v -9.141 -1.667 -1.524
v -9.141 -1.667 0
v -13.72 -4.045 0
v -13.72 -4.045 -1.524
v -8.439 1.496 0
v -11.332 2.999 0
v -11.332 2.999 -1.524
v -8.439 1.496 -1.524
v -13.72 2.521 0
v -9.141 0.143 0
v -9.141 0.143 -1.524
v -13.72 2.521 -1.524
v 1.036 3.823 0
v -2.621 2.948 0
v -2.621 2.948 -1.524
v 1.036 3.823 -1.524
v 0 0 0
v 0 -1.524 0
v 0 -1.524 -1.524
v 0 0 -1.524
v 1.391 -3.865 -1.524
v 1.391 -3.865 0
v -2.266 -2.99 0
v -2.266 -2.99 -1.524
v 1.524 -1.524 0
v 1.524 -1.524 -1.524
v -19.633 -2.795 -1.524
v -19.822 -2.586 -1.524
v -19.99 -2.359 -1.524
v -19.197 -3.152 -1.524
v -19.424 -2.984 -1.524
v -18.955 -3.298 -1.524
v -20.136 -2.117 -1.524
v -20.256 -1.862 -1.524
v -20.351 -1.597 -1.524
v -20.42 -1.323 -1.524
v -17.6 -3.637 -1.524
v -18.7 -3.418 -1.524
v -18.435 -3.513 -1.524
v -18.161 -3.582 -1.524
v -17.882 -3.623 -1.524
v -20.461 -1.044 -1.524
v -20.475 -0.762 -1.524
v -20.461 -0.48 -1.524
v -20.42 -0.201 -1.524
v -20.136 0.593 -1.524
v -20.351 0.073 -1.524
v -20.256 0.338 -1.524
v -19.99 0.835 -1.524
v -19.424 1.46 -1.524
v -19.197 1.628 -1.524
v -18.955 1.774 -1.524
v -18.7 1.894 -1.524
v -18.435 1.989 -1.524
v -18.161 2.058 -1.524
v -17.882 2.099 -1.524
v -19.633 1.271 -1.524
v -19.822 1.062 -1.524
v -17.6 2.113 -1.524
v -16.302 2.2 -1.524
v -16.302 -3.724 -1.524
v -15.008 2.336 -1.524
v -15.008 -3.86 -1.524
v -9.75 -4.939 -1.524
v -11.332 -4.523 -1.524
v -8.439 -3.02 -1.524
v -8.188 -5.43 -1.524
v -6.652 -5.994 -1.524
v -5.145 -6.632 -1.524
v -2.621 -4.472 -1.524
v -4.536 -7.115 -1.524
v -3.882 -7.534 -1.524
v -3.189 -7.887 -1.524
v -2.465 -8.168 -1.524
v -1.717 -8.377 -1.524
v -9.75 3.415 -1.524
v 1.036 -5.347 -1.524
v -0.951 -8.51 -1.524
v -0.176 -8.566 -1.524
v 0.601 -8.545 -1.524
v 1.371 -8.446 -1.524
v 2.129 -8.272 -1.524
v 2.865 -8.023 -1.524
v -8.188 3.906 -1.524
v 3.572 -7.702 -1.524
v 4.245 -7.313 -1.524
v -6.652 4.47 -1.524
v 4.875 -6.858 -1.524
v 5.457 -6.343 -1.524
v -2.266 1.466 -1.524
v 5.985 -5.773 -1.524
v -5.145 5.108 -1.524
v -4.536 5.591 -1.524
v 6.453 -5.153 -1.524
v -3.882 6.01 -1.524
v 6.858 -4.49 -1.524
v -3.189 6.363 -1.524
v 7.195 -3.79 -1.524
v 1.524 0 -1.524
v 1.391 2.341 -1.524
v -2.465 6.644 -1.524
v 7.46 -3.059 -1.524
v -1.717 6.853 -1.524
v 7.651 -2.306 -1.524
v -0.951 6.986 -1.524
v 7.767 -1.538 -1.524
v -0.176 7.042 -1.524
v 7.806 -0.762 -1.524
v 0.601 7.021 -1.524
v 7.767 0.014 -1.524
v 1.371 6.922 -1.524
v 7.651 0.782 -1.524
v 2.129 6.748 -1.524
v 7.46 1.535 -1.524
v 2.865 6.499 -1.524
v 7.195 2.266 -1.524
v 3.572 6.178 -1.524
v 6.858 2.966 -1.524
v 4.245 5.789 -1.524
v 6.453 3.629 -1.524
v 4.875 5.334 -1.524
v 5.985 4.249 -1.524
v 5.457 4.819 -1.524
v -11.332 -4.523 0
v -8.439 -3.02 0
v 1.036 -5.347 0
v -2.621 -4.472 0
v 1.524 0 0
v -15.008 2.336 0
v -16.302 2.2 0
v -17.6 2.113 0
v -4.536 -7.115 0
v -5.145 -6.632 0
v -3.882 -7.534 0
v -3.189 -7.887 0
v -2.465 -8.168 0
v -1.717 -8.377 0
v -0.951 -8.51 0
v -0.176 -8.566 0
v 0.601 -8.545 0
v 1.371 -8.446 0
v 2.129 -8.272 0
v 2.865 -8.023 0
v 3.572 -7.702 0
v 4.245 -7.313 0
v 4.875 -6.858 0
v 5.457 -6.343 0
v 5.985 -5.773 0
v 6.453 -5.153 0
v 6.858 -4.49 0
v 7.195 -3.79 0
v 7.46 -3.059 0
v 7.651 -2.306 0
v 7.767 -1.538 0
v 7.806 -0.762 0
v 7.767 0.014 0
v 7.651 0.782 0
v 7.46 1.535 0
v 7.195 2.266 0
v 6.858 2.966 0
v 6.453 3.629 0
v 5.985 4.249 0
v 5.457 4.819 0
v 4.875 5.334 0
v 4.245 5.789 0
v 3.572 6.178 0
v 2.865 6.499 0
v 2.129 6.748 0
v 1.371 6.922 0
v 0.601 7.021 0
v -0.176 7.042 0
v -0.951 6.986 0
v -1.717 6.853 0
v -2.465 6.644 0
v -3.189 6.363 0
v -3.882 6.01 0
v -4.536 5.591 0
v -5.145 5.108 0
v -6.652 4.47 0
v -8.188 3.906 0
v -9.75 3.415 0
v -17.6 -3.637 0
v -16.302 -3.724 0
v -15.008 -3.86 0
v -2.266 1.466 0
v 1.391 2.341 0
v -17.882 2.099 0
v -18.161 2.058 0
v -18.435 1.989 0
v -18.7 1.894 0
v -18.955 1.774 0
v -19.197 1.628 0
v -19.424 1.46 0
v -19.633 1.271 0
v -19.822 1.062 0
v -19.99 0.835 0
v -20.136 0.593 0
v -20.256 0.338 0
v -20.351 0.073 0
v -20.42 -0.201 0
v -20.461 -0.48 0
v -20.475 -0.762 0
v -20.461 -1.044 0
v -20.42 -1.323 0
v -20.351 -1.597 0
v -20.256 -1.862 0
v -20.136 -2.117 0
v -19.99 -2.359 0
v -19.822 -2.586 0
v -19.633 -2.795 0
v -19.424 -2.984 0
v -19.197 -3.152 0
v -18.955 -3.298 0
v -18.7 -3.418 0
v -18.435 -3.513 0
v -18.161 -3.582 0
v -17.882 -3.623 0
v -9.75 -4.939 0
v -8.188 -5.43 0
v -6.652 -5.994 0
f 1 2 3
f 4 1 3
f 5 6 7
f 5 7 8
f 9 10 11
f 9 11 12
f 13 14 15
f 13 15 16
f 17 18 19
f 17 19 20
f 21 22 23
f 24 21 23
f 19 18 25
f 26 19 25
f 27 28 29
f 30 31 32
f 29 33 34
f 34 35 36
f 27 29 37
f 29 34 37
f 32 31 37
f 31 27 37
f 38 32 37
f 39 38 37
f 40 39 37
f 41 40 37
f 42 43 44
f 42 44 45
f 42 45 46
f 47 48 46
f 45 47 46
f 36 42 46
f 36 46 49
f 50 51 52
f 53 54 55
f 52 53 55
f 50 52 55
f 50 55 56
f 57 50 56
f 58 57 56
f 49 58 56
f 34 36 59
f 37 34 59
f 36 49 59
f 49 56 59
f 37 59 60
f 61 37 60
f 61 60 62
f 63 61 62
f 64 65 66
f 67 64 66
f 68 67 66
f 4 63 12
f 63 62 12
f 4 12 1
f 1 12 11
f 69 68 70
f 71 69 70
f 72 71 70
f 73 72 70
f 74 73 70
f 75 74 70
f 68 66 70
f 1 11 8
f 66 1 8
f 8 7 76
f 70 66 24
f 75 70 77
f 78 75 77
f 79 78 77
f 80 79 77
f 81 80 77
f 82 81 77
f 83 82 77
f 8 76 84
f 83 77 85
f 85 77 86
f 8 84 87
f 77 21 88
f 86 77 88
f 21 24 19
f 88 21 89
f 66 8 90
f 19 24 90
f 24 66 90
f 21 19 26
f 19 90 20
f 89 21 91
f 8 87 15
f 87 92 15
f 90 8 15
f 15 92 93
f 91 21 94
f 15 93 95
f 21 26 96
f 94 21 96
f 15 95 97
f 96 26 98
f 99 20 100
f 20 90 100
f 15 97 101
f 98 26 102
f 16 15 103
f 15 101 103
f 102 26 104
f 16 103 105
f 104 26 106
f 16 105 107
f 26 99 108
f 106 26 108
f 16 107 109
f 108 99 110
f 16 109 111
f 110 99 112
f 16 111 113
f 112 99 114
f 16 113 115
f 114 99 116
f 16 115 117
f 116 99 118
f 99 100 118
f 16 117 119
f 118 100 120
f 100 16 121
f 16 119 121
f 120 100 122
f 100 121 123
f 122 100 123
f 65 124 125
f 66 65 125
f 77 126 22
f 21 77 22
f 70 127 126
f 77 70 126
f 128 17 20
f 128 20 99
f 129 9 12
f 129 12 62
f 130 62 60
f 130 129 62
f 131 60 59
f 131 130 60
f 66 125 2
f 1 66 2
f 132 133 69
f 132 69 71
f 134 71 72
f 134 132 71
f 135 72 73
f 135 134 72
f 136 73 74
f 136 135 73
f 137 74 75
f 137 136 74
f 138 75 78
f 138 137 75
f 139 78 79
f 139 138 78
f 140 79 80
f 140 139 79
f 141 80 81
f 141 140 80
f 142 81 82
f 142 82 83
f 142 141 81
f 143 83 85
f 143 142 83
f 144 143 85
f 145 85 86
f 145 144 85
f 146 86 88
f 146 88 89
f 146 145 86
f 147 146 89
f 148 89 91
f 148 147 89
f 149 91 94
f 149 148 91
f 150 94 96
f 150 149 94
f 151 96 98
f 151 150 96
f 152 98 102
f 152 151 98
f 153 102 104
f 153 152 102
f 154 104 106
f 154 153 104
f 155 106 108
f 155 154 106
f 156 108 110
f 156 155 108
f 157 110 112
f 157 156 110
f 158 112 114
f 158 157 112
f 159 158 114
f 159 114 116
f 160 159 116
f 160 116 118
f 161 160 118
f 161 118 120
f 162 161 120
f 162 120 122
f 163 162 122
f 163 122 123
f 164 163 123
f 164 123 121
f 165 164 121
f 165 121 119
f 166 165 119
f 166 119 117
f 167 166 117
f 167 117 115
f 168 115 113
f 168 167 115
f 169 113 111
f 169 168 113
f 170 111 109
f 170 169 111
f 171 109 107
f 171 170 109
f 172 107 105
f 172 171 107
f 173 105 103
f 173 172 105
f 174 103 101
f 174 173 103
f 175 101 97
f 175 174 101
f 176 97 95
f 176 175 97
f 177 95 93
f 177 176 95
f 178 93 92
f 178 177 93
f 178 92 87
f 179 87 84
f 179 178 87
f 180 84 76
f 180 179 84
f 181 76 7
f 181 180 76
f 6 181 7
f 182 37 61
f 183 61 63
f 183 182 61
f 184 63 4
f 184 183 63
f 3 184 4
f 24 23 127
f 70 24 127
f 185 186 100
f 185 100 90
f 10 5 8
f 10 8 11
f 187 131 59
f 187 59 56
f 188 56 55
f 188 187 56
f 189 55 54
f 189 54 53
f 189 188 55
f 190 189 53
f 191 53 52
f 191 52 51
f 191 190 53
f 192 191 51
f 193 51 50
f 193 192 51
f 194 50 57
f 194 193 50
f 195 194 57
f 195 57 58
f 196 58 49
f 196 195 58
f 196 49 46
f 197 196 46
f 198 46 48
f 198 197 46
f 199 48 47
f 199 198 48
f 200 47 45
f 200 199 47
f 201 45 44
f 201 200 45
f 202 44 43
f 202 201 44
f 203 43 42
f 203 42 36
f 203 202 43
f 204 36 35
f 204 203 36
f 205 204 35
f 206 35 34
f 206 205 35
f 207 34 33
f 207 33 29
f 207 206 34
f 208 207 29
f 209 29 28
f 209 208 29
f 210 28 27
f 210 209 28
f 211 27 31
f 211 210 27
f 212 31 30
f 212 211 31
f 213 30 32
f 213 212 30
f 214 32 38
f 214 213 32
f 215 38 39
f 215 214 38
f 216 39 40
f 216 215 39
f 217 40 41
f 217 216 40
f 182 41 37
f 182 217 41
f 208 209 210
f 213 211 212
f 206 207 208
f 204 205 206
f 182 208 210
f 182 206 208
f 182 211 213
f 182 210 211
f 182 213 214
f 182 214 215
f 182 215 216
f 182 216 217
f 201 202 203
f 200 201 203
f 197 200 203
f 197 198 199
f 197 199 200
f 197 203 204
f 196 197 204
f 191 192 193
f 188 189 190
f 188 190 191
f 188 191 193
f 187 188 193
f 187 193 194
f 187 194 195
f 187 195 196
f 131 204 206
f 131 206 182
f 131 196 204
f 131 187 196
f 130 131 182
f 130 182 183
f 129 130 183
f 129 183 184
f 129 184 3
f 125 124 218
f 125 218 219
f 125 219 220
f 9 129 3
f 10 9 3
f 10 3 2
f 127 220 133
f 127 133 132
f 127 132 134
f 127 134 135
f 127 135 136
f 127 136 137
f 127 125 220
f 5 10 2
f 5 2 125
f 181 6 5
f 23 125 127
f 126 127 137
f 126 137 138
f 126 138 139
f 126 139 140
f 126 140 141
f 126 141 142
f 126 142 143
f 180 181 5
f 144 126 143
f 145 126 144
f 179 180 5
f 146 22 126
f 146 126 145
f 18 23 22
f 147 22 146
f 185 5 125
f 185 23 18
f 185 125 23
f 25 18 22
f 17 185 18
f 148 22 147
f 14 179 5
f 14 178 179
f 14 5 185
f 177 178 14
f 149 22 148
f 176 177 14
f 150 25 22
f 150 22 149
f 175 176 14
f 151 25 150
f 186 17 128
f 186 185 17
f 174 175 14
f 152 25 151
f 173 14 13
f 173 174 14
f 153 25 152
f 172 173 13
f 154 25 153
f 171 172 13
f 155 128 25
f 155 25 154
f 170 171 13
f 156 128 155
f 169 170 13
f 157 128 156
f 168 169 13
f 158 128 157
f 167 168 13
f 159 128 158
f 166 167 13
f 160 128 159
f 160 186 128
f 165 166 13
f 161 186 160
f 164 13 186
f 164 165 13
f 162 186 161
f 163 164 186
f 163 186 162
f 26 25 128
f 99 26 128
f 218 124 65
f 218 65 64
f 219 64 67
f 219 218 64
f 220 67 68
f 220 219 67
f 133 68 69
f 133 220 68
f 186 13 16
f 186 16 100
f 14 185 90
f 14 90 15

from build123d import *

# Parameters (mm, degrees)
SKETCH1_W           = 1.524
SKETCH1_H           = 1.524
BOSS_EXTRUDE1_DEPTH = 1.524
CUT_EXTRUDE1_DEPTH  = 2.54
CUT_EXTRUDE2_DEPTH  = 2.54


with BuildPart() as part:
    # Sketch1 → Boss-Extrude1 (new body)
    with BuildSketch(Plane.XY):
        with BuildLine():
            ThreePointArc((-5.144991791, -6.632201856), (7.805780573, -0.762), (-5.144991791, 5.108201856))
            ThreePointArc((-5.144991791, 5.108201856), (-11.231180242, 3.023042691), (-17.599967494, 2.113027551))
            ThreePointArc((-17.599967494, 2.113027551), (-20.474995045, -0.762), (-17.599967494, -3.637027551))
            ThreePointArc((-17.599967494, -3.637027551), (-11.231180242, -4.547042691), (-5.144991791, -6.632201856))
        make_face()
        with Locations((0.762, -0.762)):
            Rectangle(SKETCH1_W, SKETCH1_H, mode=Mode.SUBTRACT)
    extrude(amount=-BOSS_EXTRUDE1_DEPTH)

    # Sketch2 → Cut-Extrude1 (cut)
    with BuildSketch(Plane.XY):
        Polygon((-9.141246891, -1.667471429), (-13.932743082, -4.156077978), (-13.230301809, -5.508539533), (-8.438805618, -3.019932984), align=None)
        Polygon((-13.932743082, 2.632077978), (-13.230301809, 3.984539533), (-8.438805618, 1.495932984), (-9.141246891, 0.143471429), align=None)
    extrude(amount=-CUT_EXTRUDE1_DEPTH, mode=Mode.SUBTRACT)

    # Sketch3 → Cut-Extrude2 (cut)
    with BuildSketch(Plane.XY):
        Polygon((1.03592119, 3.823335546), (1.390623256, 2.34118763), (-2.266113377, 1.466071171), (-2.620815442, 2.948219087), align=None)
        Polygon((-2.620815442, -4.472219087), (1.03592119, -5.347335546), (1.390623256, -3.86518763), (-2.266113377, -2.990071171), align=None)
    extrude(amount=-CUT_EXTRUDE2_DEPTH, mode=Mode.SUBTRACT)


solid = part.part
